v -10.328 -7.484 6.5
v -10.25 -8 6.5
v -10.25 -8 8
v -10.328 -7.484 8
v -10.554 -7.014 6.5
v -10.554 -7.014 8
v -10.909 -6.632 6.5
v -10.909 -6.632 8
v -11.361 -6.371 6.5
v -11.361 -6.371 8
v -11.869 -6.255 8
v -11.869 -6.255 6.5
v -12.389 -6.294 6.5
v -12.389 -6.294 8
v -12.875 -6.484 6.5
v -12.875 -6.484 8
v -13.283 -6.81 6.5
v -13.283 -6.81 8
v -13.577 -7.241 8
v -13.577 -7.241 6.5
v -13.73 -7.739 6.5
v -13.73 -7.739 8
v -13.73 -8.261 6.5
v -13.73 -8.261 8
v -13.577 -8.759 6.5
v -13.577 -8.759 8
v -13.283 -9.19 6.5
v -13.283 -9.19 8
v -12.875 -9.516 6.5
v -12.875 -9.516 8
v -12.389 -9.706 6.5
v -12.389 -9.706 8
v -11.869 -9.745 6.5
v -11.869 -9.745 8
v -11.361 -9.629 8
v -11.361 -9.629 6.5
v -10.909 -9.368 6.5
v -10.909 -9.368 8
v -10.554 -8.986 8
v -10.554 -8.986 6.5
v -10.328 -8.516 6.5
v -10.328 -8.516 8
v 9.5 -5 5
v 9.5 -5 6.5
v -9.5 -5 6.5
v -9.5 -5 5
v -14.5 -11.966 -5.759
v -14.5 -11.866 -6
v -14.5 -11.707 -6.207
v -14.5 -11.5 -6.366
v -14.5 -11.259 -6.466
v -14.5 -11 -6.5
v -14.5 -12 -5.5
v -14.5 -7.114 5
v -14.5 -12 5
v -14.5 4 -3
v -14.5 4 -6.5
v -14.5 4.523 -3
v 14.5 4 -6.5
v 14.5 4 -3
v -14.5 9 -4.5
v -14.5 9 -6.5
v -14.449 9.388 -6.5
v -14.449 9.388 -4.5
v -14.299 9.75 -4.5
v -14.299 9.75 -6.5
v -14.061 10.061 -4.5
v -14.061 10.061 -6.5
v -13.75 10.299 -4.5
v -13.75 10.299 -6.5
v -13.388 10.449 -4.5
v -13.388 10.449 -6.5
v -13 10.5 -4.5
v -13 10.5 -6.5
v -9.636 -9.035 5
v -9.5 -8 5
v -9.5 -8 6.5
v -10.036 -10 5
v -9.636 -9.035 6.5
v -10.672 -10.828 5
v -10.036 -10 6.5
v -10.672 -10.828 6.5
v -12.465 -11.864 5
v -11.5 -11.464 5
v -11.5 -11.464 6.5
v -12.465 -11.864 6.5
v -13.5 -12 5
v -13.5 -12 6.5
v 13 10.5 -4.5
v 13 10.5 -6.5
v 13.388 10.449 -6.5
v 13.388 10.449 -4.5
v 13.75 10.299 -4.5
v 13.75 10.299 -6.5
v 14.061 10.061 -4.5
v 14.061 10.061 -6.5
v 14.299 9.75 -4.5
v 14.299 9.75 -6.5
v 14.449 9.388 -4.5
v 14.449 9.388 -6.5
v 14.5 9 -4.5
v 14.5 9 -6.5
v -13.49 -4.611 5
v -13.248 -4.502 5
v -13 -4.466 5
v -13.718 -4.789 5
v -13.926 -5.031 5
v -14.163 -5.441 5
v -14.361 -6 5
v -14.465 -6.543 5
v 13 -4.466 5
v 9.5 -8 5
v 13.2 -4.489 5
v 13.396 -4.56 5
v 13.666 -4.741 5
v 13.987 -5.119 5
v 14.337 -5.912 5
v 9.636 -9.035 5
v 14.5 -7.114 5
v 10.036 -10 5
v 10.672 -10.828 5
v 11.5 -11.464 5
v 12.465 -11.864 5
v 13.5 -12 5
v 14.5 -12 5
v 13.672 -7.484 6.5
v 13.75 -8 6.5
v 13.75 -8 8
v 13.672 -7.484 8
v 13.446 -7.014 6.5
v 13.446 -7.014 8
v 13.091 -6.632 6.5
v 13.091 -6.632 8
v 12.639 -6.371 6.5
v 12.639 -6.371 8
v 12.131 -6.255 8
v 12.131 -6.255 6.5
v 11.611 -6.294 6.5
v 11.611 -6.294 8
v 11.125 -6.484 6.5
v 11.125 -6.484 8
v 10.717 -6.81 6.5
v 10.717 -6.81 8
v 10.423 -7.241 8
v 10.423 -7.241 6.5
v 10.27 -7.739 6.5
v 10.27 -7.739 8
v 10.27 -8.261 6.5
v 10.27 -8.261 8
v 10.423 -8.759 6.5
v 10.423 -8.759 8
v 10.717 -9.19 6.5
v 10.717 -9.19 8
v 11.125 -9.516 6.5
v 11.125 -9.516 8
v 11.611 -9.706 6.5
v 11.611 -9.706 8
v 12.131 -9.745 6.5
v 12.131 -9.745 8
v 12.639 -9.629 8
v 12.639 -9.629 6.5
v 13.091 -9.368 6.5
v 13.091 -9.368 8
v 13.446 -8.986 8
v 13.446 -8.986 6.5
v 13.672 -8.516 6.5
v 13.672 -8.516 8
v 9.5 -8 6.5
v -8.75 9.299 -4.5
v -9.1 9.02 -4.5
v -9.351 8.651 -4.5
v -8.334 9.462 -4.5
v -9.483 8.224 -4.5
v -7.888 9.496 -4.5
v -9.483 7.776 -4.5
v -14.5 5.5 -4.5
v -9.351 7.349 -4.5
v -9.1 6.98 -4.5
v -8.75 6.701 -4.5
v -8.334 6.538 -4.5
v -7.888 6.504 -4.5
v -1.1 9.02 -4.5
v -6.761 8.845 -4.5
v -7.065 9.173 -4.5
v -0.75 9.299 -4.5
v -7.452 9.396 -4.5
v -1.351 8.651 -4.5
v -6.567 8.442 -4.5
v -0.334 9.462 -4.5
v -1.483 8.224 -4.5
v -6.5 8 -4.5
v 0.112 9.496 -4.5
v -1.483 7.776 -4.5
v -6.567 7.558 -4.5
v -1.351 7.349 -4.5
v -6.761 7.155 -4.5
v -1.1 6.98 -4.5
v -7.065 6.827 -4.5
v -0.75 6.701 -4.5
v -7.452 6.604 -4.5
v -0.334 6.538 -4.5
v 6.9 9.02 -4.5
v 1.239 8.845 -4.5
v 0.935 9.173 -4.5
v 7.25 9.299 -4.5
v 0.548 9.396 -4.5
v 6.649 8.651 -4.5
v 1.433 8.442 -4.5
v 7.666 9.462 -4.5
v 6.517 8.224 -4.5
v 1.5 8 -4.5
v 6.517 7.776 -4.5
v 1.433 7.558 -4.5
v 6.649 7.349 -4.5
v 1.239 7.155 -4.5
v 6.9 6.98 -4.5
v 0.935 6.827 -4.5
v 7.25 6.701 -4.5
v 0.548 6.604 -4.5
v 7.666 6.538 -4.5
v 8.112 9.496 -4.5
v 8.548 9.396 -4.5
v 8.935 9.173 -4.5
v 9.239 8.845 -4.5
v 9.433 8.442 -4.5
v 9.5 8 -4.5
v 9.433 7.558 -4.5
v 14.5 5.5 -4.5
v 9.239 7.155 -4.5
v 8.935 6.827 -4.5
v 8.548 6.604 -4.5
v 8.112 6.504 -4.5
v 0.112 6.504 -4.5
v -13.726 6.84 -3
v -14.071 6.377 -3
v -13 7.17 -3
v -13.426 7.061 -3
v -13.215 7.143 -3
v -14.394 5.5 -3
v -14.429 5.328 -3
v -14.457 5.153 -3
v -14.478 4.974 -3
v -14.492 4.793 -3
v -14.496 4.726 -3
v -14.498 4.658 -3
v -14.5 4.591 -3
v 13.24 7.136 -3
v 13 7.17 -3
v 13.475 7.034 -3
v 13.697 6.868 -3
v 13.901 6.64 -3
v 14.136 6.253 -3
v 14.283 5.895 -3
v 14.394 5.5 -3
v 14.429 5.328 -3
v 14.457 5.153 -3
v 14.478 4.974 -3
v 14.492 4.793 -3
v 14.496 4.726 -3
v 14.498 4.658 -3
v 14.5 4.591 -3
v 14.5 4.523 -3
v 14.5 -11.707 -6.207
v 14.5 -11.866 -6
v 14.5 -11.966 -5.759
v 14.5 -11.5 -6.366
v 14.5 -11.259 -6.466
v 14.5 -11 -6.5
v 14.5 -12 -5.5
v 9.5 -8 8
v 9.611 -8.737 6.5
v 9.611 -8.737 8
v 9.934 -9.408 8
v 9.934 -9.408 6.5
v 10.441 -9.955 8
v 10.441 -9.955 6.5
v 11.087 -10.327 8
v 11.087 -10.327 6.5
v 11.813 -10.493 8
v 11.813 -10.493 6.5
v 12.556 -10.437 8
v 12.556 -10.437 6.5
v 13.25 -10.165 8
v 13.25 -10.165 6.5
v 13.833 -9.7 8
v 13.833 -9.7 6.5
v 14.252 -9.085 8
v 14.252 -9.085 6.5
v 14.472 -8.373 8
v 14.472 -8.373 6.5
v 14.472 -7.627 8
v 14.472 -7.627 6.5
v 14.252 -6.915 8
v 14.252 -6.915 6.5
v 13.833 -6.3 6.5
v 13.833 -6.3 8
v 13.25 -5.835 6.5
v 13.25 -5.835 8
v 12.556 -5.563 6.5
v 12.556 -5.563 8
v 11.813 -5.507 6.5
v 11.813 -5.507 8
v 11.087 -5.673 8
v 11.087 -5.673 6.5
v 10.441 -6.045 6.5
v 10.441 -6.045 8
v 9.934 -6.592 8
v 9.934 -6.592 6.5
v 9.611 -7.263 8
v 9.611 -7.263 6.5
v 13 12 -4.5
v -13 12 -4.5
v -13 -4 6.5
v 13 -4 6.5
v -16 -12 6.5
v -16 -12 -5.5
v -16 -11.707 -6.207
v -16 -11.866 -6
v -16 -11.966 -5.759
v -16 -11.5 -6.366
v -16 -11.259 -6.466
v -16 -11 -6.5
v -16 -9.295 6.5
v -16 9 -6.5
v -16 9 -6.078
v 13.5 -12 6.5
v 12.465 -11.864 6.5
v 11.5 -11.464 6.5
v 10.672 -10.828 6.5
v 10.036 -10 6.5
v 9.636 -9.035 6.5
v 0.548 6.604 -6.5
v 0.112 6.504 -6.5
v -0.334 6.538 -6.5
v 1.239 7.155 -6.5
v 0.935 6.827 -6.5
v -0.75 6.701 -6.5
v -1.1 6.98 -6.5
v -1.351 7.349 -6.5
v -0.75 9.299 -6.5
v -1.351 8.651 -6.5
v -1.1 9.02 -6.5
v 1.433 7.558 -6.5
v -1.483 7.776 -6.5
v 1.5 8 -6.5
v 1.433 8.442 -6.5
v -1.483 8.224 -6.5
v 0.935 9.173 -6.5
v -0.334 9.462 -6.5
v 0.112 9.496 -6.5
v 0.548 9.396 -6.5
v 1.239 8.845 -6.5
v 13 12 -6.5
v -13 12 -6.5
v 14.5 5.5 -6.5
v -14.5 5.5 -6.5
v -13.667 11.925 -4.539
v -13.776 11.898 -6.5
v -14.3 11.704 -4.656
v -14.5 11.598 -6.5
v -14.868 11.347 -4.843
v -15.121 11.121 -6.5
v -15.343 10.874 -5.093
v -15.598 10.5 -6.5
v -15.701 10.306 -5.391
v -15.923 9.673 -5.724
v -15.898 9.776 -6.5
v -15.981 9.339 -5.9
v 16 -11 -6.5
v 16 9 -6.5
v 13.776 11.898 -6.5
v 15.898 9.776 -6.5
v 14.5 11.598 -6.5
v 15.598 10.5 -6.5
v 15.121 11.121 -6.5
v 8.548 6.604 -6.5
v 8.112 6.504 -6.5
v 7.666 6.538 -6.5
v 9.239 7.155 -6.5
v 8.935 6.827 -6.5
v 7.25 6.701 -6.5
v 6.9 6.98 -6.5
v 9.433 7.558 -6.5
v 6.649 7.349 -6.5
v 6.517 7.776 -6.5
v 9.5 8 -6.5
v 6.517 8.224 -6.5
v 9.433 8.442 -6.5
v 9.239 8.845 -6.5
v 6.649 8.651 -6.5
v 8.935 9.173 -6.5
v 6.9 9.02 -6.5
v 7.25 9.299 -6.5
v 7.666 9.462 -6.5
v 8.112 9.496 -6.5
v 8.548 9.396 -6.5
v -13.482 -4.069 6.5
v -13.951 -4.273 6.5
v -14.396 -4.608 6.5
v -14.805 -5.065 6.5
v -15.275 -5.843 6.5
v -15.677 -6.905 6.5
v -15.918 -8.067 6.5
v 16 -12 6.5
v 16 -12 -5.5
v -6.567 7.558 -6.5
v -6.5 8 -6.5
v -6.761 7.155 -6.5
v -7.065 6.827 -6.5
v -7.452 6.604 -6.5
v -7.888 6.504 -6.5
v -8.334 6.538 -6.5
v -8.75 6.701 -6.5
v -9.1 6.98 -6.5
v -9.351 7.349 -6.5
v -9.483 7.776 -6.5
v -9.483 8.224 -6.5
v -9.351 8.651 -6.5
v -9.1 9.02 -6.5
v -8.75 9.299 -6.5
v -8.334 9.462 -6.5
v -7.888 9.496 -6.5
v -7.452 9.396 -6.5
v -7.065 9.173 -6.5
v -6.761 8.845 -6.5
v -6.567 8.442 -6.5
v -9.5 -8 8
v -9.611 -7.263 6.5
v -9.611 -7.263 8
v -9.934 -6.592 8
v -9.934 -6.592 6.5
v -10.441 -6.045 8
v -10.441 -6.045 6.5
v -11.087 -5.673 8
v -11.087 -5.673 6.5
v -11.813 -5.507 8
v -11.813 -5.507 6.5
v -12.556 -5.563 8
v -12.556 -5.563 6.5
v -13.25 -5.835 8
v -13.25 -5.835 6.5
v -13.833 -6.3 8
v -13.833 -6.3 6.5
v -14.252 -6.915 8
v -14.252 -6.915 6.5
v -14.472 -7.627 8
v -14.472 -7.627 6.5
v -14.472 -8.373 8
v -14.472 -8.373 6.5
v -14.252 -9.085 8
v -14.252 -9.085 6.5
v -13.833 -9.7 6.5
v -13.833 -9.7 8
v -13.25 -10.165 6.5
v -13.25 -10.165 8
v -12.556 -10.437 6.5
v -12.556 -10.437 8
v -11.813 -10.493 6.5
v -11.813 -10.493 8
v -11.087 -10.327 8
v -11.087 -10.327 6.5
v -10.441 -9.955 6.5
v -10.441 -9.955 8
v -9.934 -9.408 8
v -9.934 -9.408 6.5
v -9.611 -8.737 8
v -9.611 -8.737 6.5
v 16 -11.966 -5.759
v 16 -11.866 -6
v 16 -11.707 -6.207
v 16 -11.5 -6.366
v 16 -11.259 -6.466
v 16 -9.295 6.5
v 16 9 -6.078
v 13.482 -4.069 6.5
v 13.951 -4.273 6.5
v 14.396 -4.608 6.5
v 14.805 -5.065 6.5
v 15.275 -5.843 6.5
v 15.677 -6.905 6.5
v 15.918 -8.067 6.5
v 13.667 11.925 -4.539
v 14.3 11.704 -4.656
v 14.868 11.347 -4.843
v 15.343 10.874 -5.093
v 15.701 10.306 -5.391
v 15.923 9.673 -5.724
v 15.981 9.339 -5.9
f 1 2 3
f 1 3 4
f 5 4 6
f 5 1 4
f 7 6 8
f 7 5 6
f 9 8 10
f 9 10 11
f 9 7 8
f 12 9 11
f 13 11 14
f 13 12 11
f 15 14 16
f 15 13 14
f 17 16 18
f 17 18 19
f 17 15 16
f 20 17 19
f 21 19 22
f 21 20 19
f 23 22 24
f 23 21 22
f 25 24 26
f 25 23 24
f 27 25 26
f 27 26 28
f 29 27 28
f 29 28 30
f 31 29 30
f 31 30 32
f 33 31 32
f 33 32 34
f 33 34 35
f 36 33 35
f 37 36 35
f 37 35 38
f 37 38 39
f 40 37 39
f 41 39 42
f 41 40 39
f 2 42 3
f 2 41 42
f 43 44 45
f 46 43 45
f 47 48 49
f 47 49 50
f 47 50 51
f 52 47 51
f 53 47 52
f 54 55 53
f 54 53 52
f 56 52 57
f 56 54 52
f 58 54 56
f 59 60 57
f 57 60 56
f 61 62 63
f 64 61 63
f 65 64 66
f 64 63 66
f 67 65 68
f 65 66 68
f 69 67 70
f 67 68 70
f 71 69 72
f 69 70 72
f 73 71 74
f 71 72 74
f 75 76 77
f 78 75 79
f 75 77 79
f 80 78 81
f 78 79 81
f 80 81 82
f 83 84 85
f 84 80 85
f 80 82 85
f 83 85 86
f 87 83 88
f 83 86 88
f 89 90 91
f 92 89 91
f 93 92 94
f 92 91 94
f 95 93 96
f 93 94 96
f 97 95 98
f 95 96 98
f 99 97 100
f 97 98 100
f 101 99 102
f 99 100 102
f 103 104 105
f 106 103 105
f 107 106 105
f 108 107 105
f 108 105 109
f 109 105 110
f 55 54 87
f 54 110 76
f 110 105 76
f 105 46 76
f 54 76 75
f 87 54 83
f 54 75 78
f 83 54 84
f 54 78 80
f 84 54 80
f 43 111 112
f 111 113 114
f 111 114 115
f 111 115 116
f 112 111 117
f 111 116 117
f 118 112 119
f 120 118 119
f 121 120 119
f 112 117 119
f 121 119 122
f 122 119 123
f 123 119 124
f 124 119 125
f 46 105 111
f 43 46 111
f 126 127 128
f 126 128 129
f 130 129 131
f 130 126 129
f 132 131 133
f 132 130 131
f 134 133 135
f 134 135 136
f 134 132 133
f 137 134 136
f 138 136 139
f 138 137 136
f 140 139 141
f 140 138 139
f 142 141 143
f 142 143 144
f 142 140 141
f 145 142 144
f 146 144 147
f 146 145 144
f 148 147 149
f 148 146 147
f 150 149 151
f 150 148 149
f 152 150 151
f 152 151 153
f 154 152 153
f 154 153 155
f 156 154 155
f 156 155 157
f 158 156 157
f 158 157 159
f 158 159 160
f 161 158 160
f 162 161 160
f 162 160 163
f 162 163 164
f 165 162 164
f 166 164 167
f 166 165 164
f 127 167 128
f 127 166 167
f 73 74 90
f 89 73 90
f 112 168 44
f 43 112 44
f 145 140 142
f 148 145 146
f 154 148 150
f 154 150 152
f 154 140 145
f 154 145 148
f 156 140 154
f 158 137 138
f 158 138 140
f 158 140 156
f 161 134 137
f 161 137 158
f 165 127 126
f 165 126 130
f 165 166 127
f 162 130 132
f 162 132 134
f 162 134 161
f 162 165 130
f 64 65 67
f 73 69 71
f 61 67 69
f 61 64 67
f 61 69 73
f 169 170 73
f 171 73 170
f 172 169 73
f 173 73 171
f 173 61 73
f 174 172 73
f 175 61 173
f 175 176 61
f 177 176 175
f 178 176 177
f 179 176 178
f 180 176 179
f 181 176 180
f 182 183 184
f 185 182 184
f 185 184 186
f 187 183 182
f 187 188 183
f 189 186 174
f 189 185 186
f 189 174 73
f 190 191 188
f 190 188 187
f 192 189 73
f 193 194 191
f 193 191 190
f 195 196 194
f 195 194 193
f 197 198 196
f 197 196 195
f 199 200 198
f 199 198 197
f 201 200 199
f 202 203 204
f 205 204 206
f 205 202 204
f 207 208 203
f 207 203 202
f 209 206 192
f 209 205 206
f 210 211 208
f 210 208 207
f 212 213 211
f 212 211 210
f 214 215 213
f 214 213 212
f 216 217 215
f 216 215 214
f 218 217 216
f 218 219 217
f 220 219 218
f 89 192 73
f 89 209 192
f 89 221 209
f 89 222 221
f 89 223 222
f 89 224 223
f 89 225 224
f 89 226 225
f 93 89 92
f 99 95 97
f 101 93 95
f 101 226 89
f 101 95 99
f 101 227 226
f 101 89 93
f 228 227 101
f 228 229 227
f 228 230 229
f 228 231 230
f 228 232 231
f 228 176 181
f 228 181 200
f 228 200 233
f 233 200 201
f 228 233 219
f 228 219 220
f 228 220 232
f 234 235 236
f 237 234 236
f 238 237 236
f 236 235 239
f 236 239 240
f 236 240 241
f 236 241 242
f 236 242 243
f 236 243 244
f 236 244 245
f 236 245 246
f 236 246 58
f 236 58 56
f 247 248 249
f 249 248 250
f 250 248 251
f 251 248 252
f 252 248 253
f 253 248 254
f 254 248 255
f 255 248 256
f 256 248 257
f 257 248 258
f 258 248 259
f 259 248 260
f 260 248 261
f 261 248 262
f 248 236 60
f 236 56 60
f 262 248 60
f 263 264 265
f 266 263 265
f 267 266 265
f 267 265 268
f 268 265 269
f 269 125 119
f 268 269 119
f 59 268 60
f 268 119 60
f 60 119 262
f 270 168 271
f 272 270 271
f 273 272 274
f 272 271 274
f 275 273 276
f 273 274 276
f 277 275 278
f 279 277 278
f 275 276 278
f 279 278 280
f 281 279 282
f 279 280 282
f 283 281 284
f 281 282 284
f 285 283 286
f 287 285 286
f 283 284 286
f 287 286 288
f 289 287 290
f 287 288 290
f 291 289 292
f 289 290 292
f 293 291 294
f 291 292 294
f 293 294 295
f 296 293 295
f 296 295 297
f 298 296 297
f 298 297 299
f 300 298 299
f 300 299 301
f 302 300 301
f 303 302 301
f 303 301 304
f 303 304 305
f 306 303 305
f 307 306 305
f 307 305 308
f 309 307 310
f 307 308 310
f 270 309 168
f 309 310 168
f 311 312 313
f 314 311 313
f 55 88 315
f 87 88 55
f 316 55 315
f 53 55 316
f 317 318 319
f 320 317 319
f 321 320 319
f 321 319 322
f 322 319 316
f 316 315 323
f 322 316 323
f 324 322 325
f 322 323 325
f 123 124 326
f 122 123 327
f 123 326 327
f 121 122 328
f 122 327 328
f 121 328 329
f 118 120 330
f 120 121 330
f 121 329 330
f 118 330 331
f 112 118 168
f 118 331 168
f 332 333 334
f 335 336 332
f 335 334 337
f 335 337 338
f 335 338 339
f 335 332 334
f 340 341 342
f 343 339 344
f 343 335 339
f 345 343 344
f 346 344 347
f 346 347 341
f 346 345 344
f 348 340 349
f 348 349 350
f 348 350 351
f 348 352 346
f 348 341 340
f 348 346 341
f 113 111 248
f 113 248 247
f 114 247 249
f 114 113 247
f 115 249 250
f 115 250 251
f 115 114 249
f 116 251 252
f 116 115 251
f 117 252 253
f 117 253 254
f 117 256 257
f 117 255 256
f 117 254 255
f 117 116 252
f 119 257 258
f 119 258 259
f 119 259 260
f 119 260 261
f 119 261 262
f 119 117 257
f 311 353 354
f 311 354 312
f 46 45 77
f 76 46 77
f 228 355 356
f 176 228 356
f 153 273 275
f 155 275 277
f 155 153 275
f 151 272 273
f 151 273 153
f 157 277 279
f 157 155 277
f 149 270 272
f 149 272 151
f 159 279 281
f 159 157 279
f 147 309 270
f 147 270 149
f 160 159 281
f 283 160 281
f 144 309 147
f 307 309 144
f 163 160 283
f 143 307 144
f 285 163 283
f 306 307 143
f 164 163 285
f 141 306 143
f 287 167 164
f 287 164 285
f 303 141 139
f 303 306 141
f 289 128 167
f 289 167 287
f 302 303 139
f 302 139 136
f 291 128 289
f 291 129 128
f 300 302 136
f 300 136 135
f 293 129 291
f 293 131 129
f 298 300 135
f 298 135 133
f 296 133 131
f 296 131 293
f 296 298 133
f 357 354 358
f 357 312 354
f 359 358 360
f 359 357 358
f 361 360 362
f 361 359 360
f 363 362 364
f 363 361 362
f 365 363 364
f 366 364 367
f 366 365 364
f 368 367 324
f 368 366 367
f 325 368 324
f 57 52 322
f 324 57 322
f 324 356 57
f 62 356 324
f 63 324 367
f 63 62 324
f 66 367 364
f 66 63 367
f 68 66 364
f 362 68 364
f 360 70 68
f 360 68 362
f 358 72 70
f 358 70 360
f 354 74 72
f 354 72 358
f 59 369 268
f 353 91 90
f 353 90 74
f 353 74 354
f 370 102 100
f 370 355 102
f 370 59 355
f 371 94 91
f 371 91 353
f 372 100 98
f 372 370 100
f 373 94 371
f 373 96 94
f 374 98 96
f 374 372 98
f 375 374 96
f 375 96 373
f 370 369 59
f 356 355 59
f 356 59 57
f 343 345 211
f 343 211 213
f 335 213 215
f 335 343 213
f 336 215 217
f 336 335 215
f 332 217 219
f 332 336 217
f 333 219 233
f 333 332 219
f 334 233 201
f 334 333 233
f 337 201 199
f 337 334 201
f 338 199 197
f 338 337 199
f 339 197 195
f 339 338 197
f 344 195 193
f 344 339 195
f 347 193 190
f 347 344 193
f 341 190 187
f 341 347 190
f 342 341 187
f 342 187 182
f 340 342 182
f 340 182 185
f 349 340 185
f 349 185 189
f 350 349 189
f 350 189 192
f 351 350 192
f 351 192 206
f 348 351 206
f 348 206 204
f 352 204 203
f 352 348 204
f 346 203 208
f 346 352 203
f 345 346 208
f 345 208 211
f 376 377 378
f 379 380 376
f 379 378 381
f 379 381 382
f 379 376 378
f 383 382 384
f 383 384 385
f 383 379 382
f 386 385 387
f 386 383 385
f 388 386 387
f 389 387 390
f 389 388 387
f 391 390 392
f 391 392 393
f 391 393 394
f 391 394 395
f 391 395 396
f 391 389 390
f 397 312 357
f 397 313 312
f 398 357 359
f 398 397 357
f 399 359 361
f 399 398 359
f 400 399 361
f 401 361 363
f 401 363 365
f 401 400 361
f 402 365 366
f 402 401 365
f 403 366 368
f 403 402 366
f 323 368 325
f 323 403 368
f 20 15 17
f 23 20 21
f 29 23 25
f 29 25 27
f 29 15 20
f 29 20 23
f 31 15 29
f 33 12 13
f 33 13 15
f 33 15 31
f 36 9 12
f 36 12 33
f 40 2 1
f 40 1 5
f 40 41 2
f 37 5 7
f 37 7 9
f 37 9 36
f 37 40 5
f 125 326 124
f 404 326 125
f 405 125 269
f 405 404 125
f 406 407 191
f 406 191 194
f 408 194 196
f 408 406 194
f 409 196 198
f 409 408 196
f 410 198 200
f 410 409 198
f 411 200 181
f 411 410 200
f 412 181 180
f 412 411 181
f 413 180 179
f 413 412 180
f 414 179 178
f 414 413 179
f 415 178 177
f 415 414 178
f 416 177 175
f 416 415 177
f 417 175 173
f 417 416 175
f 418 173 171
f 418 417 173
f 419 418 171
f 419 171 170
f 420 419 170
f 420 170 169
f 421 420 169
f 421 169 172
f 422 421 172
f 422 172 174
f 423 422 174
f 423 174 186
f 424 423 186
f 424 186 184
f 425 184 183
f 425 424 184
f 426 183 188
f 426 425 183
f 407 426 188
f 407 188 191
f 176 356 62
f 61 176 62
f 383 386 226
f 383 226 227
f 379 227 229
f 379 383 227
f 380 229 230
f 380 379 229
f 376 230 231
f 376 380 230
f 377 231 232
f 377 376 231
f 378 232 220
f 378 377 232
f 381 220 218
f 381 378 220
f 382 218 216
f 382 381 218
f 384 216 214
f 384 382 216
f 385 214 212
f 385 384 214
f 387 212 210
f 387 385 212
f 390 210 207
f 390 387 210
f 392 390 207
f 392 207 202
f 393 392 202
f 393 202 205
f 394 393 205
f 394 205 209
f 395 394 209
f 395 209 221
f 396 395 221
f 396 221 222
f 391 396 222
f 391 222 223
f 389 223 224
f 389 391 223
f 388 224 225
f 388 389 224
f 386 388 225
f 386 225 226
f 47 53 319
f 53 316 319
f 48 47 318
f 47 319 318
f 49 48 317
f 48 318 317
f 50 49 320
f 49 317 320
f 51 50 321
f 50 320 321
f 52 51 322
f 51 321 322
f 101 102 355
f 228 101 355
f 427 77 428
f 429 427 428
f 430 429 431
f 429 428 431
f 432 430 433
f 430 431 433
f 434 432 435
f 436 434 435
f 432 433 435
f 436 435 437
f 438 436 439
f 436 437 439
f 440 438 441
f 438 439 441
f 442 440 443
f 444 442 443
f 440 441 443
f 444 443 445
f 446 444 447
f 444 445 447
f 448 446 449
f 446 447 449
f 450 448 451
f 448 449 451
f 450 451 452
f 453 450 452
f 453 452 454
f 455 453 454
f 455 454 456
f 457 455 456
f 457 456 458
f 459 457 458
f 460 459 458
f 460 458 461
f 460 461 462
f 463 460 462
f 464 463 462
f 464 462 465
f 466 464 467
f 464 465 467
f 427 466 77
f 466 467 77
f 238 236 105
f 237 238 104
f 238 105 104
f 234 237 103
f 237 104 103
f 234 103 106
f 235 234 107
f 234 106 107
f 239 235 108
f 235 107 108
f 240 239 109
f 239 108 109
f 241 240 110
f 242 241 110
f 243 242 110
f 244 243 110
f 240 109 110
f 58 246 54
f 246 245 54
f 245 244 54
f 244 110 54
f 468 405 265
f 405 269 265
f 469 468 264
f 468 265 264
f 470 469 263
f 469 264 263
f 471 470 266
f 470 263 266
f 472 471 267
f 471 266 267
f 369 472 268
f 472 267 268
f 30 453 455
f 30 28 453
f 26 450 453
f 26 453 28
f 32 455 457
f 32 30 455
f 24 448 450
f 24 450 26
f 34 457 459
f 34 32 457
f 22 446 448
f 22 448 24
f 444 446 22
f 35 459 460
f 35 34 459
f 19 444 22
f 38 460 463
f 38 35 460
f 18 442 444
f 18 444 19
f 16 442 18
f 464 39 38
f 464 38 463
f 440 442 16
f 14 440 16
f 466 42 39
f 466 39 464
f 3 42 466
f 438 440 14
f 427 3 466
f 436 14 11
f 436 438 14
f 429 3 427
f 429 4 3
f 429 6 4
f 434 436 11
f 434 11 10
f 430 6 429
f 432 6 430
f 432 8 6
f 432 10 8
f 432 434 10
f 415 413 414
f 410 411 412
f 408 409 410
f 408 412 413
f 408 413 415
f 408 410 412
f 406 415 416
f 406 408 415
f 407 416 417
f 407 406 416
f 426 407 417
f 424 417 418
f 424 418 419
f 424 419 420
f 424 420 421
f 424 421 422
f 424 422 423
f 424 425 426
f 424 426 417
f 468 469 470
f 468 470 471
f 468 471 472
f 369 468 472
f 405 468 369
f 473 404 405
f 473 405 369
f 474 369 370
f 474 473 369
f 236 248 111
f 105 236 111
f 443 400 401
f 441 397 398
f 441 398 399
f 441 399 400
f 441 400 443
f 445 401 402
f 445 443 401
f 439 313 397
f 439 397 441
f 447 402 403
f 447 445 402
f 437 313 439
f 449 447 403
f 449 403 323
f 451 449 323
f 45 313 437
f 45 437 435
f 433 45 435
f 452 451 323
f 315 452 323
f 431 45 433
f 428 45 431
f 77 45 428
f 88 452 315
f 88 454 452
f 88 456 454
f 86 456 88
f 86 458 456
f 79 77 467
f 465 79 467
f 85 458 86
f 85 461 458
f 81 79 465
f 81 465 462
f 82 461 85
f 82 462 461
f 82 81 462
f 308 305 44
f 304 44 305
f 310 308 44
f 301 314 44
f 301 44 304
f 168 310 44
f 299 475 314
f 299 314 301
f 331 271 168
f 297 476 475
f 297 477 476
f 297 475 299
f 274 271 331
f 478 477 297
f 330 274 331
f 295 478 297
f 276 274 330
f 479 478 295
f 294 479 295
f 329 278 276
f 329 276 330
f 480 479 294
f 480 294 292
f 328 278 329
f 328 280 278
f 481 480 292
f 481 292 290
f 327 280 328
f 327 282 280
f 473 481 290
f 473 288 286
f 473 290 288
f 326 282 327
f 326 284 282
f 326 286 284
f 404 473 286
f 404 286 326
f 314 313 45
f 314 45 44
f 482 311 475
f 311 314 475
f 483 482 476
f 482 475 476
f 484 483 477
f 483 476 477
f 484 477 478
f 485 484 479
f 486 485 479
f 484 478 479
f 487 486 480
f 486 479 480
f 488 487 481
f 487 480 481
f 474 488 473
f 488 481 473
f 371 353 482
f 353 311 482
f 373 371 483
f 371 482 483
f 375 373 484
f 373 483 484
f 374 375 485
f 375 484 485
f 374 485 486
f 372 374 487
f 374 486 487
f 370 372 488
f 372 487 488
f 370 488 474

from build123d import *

# Parameters (mm, degrees)
F1_DEPTH     = 16
F2_R         = 3
F3_R         = 1.5
F4_DEPTH     = 2
F5_T         = 1.5
F5_T3_DEPTH  = 5
F5_T5_DEPTH  = 6.5
F5_T7_DEPTH  = 32
F5_T9_DEPTH  = 29
F5_T12_ANGLE = 90.000000001
F5_T14_ANGLE = 90.000000001
F7_DEPTH     = 13.001
F6_R         = 2.5
F6_R_2       = 1.75
F8_DEPTH     = 1.5
F9_R         = 1


# Not quite as in the source:
# - a shell that OpenCascade refuses in one call is made with other operations: the cavity is built on its own and cut out


with BuildPart() as f1:
    # F0 (on Right) → F1 (new body, symmetric)
    with BuildSketch(Plane.YZ):
        Polygon((12, -4.5), (-4, 6.5), (-12, 6.5), (-12, -6.5), (12, -6.5), align=None)
    extrude(amount=F1_DEPTH, both=True)

    # F2
    f2_edges = [f1.edges().sort_by_distance(p)[0] for p in [
        (16, 12, -5.5),
        (-16, 12, -5.5),
        (16, 4, 1),
        (-16, 4, 1),
    ]]
    fillet(f2_edges, radius=F2_R)

    # F3 (on face) → F4 (cut)
    with BuildSketch(Plane(origin=(0, 0, -6.5), x_dir=(1, 0, 0), z_dir=(0, 0, -1))):
        with BuildLine():
            ThreePointArc((13, -10.5), (14.0606601718, -10.0606601718), (14.5, -9))
            Line((14.5, -9), (14.5, -5.5))
            Line((14.5, -5.5), (-14.5, -5.5))
            Line((-14.5, -5.5), (-14.5, -9))
            ThreePointArc((-14.5, -9), (-14.0606601718, -10.0606601718), (-13, -10.5))
            Line((-13, -10.5), (13, -10.5))
        make_face()
        with Locations((-8, -8)):
            Circle(F3_R, mode=Mode.SUBTRACT)
        with Locations((0, -8)):
            Circle(F3_R, mode=Mode.SUBTRACT)
        with Locations((8, -8)):
            Circle(F3_R, mode=Mode.SUBTRACT)
    extrude(amount=-F4_DEPTH, mode=Mode.SUBTRACT)

    # F5: shell of thickness 1.5, made by hand


with BuildPart() as f5_core1:
    # F5_t2: copy of F1
    add(f1.part)

    # the walls: a layer under each face that stays
    f5_faces = [f5_core1.faces().sort_by_distance(p)[0] for p in [
        (0, 4, 1),
        (0, -8, 6.5),
        (-15.1213203436, 1.7042929957, 1.5119940115),
        (15.1213203436, 1.7042929957, 1.5119940115),
        (0, 12, -5.5),
        (-16, -1.5, 0),
        (16, -1.5, 0),
        (-15.1213203436, 11.1213203436, -5.5),
        (15.1213203436, 11.1213203436, -5.5),
        (14.0606601718, 10.0606601718, -5.5),
        (14.5, 7.25, -5.5),
        (0, 5.5, -5.5),
        (-14.5, 7.25, -5.5),
        (-14.0606601718, 10.0606601718, -5.5),
        (0, 10.5, -5.5),
        (-9.6666666667, 9.6666666667, -4.5),
        (-8, 8, -6.5),
        (0, 8, -6.5),
        (8, 8, -6.5),
    ]]
    thicken(f5_faces, amount=-F5_T, mode=Mode.SUBTRACT)

    # F5_s4 → F5_t3 (cut)
    with BuildSketch(Plane.XY.offset(-8)):
        Polygon((14.485, 5.515), (16, 5.5), (16, 4), (14.5, 4), align=None)
        Polygon((-14.485, 5.515), (-14.5, 4), (-16, 4), (-16, 5.5), align=None)
    extrude(amount=F5_T3_DEPTH, mode=Mode.SUBTRACT)

    # F5_s6 → F5_t5 (cut)
    with BuildSketch(Plane.XZ.offset(-10.5)):
        Polygon((14.485, -4.515), (16, -4.5), (16, -3), (14.5, -3), align=None)
        Polygon((-14.485, -4.515), (-16, -4.5), (-16, -3), (-14.5, -3), align=None)
    extrude(amount=F5_T5_DEPTH, mode=Mode.SUBTRACT)

    # F5_s8 → F5_t7 (cut)
    with BuildSketch(Plane.YZ.offset(-16)):
        Polygon((5.515, -4.515), (4, -4.5), (4, -3), (5.5, -3), align=None)
    extrude(amount=F5_T7_DEPTH, mode=Mode.SUBTRACT)

    # F5_s10 → F5_t9 (cut)
    with BuildSketch(Plane.YZ.offset(-14.5)):
        Polygon((10.485, -4.515), (12, -4.5), (12, -3), (10.5, -3), align=None)
    extrude(amount=F5_T9_DEPTH, mode=Mode.SUBTRACT)

    # F5_s11 → F5_t12 (revolve, cut)
    with BuildSketch(Plane.YZ.offset(13)):
        Polygon((10.485, -4.515), (12, -4.5), (12, -3), (10.5, -3), align=None)
    revolve(axis=Axis((13, 9, -4.5), (0, 0, -1)), revolution_arc=F5_T12_ANGLE, mode=Mode.SUBTRACT)

    # F5_s13 → F5_t14 (revolve, cut)
    with BuildSketch(Plane.XZ.offset(-9)):
        Polygon((-14.485, -4.515), (-16, -4.5), (-16, -3), (-14.5, -3), align=None)
    revolve(axis=Axis((-13, 9, -4.5), (0, 0, -1)), revolution_arc=F5_T14_ANGLE, mode=Mode.SUBTRACT)

    # F5_s15 → F5_t16 (revolve, cut)
    with BuildSketch(Plane.XZ.offset(-8)):
        Polygon((-6.485, -4.515), (-6.5, -3), (-8, -3), (-8, -4.5), align=None)
    revolve(axis=Axis((-8, 8, -4.5), (0, 0, -1)), mode=Mode.SUBTRACT)

    # F5_s17 → F5_t18 (revolve, cut)
    with BuildSketch(Plane.XZ.offset(-8)):
        Polygon((1.515, -4.515), (1.5, -3), (0, -3), (0, -4.5), align=None)
    revolve(axis=Axis((0, 8, -4.5), (0, 0, -1)), mode=Mode.SUBTRACT)

    # F5_s19 → F5_t20 (revolve, cut)
    with BuildSketch(Plane.XZ.offset(-8)):
        Polygon((9.515, -4.515), (9.5, -3), (8, -3), (8, -4.5), align=None)
    revolve(axis=Axis((8, 8, -4.5), (0, 0, -1)), mode=Mode.SUBTRACT)


with BuildPart() as f1_1:
    add(f1.part)

    # what is left inside the walls is the cavity
    f5_cavity = [f5_core1.part.solids().sort_by_distance(p)[0] for p in [
        (-4.833333, -4, -6.485),
    ]]
    add(f5_cavity, mode=Mode.SUBTRACT)

    # F6 (on face) → F7 (cut, through all)
    with BuildSketch(Plane.XY.offset(6.5)):
        with BuildLine():
            Line((9.5, -5), (-9.5, -5))
            Line((-9.5, -5), (-9.5, -8))
            ThreePointArc((-9.5, -8), (-10.6715728753, -10.8284271247), (-13.5, -12))
            Line((-13.5, -12), (13.5, -12))
            ThreePointArc((13.5, -12), (10.6715728753, -10.8284271247), (9.5, -8))
            Line((9.5, -8), (9.5, -5))
        make_face()
    extrude(amount=-F7_DEPTH, mode=Mode.SUBTRACT)

    # F6 (on face) → F8 (join)
    with BuildSketch(Plane.XY.offset(6.5)):
        with Locations((-12, -8)):
            Circle(F6_R)
        with Locations((-12, -8)):
            Circle(F6_R_2, mode=Mode.SUBTRACT)
        with BuildLine():
            ThreePointArc((14.5, -8), (12, -5.5), (9.5, -8))
            ThreePointArc((9.5, -8), (12, -10.5), (14.5, -8))
        make_face()
        with Locations((12, -8)):
            Circle(F6_R_2, mode=Mode.SUBTRACT)
    extrude(amount=F8_DEPTH)

    # F9
    f9_edges = [f1_1.edges().sort_by_distance(p)[0] for p in [
        (15.25, -12, -6.5),
        (-15.25, -12, -6.5),
    ]]
    fillet(f9_edges, radius=F9_R)


solid = f1_1.part
